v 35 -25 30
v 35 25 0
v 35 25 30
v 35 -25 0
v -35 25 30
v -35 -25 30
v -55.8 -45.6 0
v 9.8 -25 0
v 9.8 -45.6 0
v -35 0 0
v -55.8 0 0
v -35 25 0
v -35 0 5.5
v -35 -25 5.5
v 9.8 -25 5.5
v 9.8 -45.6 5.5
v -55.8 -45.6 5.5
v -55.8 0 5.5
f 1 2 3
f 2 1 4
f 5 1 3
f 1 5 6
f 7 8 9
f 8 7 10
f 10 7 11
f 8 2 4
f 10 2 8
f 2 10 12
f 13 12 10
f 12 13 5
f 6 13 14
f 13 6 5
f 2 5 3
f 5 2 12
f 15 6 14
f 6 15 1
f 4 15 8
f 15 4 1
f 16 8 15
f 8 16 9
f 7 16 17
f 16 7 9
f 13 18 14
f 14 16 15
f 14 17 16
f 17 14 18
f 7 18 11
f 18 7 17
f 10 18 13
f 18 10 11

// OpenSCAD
// Two-part enclosure for small electronics board (e.g., Arduino-based temp logger)
// Print orientation: both parts on the bed, side by side, with a 10 mm gap.
// Part 1 (left): open-top box. Part 2 (right): lid, printed upside down.

// ---------------- Parameters ----------------
box_x      = 70;    // box outer size in X (mm)
box_y      = 50;    // box outer size in Y (mm)
box_z      = 30;    // box outer size in Z (mm)
box_wall   = 2;     // box wall thickness (mm)
box_floor  = 2;     // box floor thickness (mm)

lip_w      = 65.6;  // lid lip outer size in X (mm)
lip_d      = 45.6;  // lid lip outer size in Y (mm)
lip_h      = 1.5;   // lid lip thickness (mm)
lip_t      = 4;     // lid plate thickness (mm)

gap        = 10;    // gap between box and lid on the bed (mm)
clearance  = 0.2;   // clearance between lid lip and box opening (mm)
eps        = 0.5;   // cutter overshoot past faces (mm)

$fn = 64;

// ---------------- Derived ----------------
box_h_internal = box_z - box_floor - box_wall;   // 27 mm
lip_w_clear    = lip_w + 2 * clearance;          // 66 mm (0.2 clearance each side)
lip_d_clear    = lip_d + 2 * clearance;          // 46 mm

// ---------------- Model ----------------
union() {
    // Part 1: Open-top box
    translate([-box_x / 2, -box_y / 2, 0])
        cube([box_x, box_y, box_z]);

    // Part 2: Lid, printed upside down.
    // Plate on the bed, lip on top of it, sliding into the box opening.
    translate([-(lip_w_clear / 2 - gap), -lip_d / 2, 0])
        linear_extrude(height = lip_t + lip_h)
            polygon([
                [-lip_w / 2, -lip_d / 2],
                [ lip_w / 2, -lip_d / 2],
                [ lip_w / 2,  lip_d / 2],
                [-lip_w / 2,  lip_d / 2]
            ]);

    // Cut the lip out except for the part that overlaps the plate (fusion)
    translate([-(lip_w / 2 + eps), -lip_d / 2 - eps, lip_t])
        cube([lip_w + 2 * eps, lip_d + 2 * eps, lip_h + eps]);
}
